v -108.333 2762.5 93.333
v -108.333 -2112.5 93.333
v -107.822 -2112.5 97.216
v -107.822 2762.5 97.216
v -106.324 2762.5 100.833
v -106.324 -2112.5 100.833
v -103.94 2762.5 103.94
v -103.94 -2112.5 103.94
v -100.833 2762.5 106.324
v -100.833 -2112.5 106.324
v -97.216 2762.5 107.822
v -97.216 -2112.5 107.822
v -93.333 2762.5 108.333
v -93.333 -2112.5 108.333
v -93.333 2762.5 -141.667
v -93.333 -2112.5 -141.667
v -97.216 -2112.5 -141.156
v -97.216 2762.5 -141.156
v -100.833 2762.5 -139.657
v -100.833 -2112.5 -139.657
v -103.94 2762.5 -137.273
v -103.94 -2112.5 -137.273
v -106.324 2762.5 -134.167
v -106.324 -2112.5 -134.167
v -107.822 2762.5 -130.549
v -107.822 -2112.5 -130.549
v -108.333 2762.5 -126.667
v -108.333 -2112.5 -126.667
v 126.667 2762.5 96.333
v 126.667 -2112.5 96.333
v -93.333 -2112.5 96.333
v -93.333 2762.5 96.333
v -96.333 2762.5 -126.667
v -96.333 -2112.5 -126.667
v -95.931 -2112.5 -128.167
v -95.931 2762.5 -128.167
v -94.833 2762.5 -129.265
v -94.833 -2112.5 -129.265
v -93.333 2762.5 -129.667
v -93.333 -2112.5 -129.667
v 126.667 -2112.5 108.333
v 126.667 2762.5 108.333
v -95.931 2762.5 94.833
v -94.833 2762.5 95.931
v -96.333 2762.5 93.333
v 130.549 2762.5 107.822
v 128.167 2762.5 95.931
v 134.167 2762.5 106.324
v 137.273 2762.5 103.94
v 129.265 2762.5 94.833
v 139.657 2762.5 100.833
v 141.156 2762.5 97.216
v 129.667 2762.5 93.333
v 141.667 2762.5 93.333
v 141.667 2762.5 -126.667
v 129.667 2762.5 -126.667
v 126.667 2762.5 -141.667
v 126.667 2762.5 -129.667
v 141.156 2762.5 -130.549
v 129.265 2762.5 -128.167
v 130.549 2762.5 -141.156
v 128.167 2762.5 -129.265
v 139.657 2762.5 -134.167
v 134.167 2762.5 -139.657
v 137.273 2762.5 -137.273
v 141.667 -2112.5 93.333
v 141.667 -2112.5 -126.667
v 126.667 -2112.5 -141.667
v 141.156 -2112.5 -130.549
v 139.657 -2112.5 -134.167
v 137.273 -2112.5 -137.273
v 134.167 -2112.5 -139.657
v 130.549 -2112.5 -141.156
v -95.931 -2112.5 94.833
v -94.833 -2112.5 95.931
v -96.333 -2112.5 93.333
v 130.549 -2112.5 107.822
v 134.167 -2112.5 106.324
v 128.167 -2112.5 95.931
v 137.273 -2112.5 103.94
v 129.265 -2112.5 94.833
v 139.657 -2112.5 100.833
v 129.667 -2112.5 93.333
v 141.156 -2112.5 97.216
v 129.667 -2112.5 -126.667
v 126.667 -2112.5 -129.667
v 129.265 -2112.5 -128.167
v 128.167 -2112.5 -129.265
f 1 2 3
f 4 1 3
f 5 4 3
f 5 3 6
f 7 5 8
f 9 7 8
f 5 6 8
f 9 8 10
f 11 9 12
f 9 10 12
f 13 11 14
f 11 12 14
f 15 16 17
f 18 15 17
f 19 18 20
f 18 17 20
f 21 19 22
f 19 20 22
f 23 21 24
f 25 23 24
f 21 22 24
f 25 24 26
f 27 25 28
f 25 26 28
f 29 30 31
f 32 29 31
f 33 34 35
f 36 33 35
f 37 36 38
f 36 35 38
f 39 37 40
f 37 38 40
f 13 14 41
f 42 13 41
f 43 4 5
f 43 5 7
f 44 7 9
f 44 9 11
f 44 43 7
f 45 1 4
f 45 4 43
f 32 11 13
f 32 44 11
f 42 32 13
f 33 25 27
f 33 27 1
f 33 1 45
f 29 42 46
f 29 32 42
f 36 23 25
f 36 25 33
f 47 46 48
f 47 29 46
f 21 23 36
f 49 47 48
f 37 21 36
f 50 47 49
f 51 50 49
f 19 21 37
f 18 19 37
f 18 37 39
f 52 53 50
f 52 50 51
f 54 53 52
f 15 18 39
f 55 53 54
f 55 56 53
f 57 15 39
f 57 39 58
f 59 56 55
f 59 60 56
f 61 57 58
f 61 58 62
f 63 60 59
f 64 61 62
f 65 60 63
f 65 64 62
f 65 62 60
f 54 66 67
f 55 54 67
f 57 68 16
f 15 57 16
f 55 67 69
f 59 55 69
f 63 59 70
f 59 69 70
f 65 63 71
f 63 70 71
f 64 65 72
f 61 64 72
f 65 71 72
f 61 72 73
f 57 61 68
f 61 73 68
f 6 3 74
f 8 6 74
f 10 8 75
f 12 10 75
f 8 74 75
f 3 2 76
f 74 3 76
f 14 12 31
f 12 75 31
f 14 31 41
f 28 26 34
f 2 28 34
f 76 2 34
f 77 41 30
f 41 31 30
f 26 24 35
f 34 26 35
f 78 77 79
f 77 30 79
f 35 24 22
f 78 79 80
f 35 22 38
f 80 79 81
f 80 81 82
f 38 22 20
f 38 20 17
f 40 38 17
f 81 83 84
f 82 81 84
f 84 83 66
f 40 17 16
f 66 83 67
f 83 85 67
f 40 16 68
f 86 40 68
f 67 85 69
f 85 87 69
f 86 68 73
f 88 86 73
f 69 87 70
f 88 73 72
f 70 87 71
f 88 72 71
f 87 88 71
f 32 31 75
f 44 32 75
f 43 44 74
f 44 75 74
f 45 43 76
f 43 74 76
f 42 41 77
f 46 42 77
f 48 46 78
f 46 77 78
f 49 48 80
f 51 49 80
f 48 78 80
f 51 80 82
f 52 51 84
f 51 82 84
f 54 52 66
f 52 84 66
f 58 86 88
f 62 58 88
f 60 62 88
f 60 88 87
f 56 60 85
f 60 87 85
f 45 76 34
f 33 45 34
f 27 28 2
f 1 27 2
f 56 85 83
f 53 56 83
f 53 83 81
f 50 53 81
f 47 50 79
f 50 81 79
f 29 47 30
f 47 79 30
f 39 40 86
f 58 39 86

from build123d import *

# Parameters (mm, degrees)
BOSS_EXTRUDE1_DEPTH = 650
SCALE1_SCALE        = 7.5


with BuildPart() as part:
    # Sketch1 → Boss-Extrude1 (new body)
    with BuildSketch(Plane(origin=(0, 0, 0), x_dir=(1, 0, 0), z_dir=(0, 1, 0))):
        with BuildLine():
            Line((2, 0), (31.333333333, 0))
            ThreePointArc((31.333333333, 0), (32.747546896, 0.585786438), (33.333333333, 2))
            Line((33.333333333, 2), (33.333333333, 31.333333333))
            ThreePointArc((33.333333333, 31.333333333), (32.747546896, 32.747546896), (31.333333333, 33.333333333))
            Line((31.333333333, 33.333333333), (2, 33.333333333))
            ThreePointArc((2, 33.333333333), (0.585786438, 32.747546896), (0, 31.333333333))
            Line((0, 31.333333333), (0, 2))
            ThreePointArc((0, 2), (0.585786438, 0.585786438), (2, 0))
        make_face()
        with BuildLine():
            Line((1.6, 2), (1.6, 31.333333333))
            ThreePointArc((1.6, 31.333333333), (1.717157288, 31.616176046), (2, 31.733333333))
            Line((2, 31.733333333), (31.333333333, 31.733333333))
            ThreePointArc((31.333333333, 31.733333333), (31.616176046, 31.616176046), (31.733333333, 31.333333333))
            Line((31.733333333, 31.333333333), (31.733333333, 2))
            ThreePointArc((31.733333333, 2), (31.616176046, 1.717157288), (31.333333333, 1.6))
            Line((31.333333333, 1.6), (2, 1.6))
            ThreePointArc((2, 1.6), (1.717157288, 1.717157288), (1.6, 2))
        make_face(mode=Mode.SUBTRACT)
    extrude(amount=BOSS_EXTRUDE1_DEPTH)


with BuildPart() as part_1:
    # Scale1: scaled about (16.666666667, 325, -16.666666667)
    add(part.part.scale(SCALE1_SCALE).moved(Location((-108.333333336, -2112.5, 108.333333336))))


solid = part_1.part
